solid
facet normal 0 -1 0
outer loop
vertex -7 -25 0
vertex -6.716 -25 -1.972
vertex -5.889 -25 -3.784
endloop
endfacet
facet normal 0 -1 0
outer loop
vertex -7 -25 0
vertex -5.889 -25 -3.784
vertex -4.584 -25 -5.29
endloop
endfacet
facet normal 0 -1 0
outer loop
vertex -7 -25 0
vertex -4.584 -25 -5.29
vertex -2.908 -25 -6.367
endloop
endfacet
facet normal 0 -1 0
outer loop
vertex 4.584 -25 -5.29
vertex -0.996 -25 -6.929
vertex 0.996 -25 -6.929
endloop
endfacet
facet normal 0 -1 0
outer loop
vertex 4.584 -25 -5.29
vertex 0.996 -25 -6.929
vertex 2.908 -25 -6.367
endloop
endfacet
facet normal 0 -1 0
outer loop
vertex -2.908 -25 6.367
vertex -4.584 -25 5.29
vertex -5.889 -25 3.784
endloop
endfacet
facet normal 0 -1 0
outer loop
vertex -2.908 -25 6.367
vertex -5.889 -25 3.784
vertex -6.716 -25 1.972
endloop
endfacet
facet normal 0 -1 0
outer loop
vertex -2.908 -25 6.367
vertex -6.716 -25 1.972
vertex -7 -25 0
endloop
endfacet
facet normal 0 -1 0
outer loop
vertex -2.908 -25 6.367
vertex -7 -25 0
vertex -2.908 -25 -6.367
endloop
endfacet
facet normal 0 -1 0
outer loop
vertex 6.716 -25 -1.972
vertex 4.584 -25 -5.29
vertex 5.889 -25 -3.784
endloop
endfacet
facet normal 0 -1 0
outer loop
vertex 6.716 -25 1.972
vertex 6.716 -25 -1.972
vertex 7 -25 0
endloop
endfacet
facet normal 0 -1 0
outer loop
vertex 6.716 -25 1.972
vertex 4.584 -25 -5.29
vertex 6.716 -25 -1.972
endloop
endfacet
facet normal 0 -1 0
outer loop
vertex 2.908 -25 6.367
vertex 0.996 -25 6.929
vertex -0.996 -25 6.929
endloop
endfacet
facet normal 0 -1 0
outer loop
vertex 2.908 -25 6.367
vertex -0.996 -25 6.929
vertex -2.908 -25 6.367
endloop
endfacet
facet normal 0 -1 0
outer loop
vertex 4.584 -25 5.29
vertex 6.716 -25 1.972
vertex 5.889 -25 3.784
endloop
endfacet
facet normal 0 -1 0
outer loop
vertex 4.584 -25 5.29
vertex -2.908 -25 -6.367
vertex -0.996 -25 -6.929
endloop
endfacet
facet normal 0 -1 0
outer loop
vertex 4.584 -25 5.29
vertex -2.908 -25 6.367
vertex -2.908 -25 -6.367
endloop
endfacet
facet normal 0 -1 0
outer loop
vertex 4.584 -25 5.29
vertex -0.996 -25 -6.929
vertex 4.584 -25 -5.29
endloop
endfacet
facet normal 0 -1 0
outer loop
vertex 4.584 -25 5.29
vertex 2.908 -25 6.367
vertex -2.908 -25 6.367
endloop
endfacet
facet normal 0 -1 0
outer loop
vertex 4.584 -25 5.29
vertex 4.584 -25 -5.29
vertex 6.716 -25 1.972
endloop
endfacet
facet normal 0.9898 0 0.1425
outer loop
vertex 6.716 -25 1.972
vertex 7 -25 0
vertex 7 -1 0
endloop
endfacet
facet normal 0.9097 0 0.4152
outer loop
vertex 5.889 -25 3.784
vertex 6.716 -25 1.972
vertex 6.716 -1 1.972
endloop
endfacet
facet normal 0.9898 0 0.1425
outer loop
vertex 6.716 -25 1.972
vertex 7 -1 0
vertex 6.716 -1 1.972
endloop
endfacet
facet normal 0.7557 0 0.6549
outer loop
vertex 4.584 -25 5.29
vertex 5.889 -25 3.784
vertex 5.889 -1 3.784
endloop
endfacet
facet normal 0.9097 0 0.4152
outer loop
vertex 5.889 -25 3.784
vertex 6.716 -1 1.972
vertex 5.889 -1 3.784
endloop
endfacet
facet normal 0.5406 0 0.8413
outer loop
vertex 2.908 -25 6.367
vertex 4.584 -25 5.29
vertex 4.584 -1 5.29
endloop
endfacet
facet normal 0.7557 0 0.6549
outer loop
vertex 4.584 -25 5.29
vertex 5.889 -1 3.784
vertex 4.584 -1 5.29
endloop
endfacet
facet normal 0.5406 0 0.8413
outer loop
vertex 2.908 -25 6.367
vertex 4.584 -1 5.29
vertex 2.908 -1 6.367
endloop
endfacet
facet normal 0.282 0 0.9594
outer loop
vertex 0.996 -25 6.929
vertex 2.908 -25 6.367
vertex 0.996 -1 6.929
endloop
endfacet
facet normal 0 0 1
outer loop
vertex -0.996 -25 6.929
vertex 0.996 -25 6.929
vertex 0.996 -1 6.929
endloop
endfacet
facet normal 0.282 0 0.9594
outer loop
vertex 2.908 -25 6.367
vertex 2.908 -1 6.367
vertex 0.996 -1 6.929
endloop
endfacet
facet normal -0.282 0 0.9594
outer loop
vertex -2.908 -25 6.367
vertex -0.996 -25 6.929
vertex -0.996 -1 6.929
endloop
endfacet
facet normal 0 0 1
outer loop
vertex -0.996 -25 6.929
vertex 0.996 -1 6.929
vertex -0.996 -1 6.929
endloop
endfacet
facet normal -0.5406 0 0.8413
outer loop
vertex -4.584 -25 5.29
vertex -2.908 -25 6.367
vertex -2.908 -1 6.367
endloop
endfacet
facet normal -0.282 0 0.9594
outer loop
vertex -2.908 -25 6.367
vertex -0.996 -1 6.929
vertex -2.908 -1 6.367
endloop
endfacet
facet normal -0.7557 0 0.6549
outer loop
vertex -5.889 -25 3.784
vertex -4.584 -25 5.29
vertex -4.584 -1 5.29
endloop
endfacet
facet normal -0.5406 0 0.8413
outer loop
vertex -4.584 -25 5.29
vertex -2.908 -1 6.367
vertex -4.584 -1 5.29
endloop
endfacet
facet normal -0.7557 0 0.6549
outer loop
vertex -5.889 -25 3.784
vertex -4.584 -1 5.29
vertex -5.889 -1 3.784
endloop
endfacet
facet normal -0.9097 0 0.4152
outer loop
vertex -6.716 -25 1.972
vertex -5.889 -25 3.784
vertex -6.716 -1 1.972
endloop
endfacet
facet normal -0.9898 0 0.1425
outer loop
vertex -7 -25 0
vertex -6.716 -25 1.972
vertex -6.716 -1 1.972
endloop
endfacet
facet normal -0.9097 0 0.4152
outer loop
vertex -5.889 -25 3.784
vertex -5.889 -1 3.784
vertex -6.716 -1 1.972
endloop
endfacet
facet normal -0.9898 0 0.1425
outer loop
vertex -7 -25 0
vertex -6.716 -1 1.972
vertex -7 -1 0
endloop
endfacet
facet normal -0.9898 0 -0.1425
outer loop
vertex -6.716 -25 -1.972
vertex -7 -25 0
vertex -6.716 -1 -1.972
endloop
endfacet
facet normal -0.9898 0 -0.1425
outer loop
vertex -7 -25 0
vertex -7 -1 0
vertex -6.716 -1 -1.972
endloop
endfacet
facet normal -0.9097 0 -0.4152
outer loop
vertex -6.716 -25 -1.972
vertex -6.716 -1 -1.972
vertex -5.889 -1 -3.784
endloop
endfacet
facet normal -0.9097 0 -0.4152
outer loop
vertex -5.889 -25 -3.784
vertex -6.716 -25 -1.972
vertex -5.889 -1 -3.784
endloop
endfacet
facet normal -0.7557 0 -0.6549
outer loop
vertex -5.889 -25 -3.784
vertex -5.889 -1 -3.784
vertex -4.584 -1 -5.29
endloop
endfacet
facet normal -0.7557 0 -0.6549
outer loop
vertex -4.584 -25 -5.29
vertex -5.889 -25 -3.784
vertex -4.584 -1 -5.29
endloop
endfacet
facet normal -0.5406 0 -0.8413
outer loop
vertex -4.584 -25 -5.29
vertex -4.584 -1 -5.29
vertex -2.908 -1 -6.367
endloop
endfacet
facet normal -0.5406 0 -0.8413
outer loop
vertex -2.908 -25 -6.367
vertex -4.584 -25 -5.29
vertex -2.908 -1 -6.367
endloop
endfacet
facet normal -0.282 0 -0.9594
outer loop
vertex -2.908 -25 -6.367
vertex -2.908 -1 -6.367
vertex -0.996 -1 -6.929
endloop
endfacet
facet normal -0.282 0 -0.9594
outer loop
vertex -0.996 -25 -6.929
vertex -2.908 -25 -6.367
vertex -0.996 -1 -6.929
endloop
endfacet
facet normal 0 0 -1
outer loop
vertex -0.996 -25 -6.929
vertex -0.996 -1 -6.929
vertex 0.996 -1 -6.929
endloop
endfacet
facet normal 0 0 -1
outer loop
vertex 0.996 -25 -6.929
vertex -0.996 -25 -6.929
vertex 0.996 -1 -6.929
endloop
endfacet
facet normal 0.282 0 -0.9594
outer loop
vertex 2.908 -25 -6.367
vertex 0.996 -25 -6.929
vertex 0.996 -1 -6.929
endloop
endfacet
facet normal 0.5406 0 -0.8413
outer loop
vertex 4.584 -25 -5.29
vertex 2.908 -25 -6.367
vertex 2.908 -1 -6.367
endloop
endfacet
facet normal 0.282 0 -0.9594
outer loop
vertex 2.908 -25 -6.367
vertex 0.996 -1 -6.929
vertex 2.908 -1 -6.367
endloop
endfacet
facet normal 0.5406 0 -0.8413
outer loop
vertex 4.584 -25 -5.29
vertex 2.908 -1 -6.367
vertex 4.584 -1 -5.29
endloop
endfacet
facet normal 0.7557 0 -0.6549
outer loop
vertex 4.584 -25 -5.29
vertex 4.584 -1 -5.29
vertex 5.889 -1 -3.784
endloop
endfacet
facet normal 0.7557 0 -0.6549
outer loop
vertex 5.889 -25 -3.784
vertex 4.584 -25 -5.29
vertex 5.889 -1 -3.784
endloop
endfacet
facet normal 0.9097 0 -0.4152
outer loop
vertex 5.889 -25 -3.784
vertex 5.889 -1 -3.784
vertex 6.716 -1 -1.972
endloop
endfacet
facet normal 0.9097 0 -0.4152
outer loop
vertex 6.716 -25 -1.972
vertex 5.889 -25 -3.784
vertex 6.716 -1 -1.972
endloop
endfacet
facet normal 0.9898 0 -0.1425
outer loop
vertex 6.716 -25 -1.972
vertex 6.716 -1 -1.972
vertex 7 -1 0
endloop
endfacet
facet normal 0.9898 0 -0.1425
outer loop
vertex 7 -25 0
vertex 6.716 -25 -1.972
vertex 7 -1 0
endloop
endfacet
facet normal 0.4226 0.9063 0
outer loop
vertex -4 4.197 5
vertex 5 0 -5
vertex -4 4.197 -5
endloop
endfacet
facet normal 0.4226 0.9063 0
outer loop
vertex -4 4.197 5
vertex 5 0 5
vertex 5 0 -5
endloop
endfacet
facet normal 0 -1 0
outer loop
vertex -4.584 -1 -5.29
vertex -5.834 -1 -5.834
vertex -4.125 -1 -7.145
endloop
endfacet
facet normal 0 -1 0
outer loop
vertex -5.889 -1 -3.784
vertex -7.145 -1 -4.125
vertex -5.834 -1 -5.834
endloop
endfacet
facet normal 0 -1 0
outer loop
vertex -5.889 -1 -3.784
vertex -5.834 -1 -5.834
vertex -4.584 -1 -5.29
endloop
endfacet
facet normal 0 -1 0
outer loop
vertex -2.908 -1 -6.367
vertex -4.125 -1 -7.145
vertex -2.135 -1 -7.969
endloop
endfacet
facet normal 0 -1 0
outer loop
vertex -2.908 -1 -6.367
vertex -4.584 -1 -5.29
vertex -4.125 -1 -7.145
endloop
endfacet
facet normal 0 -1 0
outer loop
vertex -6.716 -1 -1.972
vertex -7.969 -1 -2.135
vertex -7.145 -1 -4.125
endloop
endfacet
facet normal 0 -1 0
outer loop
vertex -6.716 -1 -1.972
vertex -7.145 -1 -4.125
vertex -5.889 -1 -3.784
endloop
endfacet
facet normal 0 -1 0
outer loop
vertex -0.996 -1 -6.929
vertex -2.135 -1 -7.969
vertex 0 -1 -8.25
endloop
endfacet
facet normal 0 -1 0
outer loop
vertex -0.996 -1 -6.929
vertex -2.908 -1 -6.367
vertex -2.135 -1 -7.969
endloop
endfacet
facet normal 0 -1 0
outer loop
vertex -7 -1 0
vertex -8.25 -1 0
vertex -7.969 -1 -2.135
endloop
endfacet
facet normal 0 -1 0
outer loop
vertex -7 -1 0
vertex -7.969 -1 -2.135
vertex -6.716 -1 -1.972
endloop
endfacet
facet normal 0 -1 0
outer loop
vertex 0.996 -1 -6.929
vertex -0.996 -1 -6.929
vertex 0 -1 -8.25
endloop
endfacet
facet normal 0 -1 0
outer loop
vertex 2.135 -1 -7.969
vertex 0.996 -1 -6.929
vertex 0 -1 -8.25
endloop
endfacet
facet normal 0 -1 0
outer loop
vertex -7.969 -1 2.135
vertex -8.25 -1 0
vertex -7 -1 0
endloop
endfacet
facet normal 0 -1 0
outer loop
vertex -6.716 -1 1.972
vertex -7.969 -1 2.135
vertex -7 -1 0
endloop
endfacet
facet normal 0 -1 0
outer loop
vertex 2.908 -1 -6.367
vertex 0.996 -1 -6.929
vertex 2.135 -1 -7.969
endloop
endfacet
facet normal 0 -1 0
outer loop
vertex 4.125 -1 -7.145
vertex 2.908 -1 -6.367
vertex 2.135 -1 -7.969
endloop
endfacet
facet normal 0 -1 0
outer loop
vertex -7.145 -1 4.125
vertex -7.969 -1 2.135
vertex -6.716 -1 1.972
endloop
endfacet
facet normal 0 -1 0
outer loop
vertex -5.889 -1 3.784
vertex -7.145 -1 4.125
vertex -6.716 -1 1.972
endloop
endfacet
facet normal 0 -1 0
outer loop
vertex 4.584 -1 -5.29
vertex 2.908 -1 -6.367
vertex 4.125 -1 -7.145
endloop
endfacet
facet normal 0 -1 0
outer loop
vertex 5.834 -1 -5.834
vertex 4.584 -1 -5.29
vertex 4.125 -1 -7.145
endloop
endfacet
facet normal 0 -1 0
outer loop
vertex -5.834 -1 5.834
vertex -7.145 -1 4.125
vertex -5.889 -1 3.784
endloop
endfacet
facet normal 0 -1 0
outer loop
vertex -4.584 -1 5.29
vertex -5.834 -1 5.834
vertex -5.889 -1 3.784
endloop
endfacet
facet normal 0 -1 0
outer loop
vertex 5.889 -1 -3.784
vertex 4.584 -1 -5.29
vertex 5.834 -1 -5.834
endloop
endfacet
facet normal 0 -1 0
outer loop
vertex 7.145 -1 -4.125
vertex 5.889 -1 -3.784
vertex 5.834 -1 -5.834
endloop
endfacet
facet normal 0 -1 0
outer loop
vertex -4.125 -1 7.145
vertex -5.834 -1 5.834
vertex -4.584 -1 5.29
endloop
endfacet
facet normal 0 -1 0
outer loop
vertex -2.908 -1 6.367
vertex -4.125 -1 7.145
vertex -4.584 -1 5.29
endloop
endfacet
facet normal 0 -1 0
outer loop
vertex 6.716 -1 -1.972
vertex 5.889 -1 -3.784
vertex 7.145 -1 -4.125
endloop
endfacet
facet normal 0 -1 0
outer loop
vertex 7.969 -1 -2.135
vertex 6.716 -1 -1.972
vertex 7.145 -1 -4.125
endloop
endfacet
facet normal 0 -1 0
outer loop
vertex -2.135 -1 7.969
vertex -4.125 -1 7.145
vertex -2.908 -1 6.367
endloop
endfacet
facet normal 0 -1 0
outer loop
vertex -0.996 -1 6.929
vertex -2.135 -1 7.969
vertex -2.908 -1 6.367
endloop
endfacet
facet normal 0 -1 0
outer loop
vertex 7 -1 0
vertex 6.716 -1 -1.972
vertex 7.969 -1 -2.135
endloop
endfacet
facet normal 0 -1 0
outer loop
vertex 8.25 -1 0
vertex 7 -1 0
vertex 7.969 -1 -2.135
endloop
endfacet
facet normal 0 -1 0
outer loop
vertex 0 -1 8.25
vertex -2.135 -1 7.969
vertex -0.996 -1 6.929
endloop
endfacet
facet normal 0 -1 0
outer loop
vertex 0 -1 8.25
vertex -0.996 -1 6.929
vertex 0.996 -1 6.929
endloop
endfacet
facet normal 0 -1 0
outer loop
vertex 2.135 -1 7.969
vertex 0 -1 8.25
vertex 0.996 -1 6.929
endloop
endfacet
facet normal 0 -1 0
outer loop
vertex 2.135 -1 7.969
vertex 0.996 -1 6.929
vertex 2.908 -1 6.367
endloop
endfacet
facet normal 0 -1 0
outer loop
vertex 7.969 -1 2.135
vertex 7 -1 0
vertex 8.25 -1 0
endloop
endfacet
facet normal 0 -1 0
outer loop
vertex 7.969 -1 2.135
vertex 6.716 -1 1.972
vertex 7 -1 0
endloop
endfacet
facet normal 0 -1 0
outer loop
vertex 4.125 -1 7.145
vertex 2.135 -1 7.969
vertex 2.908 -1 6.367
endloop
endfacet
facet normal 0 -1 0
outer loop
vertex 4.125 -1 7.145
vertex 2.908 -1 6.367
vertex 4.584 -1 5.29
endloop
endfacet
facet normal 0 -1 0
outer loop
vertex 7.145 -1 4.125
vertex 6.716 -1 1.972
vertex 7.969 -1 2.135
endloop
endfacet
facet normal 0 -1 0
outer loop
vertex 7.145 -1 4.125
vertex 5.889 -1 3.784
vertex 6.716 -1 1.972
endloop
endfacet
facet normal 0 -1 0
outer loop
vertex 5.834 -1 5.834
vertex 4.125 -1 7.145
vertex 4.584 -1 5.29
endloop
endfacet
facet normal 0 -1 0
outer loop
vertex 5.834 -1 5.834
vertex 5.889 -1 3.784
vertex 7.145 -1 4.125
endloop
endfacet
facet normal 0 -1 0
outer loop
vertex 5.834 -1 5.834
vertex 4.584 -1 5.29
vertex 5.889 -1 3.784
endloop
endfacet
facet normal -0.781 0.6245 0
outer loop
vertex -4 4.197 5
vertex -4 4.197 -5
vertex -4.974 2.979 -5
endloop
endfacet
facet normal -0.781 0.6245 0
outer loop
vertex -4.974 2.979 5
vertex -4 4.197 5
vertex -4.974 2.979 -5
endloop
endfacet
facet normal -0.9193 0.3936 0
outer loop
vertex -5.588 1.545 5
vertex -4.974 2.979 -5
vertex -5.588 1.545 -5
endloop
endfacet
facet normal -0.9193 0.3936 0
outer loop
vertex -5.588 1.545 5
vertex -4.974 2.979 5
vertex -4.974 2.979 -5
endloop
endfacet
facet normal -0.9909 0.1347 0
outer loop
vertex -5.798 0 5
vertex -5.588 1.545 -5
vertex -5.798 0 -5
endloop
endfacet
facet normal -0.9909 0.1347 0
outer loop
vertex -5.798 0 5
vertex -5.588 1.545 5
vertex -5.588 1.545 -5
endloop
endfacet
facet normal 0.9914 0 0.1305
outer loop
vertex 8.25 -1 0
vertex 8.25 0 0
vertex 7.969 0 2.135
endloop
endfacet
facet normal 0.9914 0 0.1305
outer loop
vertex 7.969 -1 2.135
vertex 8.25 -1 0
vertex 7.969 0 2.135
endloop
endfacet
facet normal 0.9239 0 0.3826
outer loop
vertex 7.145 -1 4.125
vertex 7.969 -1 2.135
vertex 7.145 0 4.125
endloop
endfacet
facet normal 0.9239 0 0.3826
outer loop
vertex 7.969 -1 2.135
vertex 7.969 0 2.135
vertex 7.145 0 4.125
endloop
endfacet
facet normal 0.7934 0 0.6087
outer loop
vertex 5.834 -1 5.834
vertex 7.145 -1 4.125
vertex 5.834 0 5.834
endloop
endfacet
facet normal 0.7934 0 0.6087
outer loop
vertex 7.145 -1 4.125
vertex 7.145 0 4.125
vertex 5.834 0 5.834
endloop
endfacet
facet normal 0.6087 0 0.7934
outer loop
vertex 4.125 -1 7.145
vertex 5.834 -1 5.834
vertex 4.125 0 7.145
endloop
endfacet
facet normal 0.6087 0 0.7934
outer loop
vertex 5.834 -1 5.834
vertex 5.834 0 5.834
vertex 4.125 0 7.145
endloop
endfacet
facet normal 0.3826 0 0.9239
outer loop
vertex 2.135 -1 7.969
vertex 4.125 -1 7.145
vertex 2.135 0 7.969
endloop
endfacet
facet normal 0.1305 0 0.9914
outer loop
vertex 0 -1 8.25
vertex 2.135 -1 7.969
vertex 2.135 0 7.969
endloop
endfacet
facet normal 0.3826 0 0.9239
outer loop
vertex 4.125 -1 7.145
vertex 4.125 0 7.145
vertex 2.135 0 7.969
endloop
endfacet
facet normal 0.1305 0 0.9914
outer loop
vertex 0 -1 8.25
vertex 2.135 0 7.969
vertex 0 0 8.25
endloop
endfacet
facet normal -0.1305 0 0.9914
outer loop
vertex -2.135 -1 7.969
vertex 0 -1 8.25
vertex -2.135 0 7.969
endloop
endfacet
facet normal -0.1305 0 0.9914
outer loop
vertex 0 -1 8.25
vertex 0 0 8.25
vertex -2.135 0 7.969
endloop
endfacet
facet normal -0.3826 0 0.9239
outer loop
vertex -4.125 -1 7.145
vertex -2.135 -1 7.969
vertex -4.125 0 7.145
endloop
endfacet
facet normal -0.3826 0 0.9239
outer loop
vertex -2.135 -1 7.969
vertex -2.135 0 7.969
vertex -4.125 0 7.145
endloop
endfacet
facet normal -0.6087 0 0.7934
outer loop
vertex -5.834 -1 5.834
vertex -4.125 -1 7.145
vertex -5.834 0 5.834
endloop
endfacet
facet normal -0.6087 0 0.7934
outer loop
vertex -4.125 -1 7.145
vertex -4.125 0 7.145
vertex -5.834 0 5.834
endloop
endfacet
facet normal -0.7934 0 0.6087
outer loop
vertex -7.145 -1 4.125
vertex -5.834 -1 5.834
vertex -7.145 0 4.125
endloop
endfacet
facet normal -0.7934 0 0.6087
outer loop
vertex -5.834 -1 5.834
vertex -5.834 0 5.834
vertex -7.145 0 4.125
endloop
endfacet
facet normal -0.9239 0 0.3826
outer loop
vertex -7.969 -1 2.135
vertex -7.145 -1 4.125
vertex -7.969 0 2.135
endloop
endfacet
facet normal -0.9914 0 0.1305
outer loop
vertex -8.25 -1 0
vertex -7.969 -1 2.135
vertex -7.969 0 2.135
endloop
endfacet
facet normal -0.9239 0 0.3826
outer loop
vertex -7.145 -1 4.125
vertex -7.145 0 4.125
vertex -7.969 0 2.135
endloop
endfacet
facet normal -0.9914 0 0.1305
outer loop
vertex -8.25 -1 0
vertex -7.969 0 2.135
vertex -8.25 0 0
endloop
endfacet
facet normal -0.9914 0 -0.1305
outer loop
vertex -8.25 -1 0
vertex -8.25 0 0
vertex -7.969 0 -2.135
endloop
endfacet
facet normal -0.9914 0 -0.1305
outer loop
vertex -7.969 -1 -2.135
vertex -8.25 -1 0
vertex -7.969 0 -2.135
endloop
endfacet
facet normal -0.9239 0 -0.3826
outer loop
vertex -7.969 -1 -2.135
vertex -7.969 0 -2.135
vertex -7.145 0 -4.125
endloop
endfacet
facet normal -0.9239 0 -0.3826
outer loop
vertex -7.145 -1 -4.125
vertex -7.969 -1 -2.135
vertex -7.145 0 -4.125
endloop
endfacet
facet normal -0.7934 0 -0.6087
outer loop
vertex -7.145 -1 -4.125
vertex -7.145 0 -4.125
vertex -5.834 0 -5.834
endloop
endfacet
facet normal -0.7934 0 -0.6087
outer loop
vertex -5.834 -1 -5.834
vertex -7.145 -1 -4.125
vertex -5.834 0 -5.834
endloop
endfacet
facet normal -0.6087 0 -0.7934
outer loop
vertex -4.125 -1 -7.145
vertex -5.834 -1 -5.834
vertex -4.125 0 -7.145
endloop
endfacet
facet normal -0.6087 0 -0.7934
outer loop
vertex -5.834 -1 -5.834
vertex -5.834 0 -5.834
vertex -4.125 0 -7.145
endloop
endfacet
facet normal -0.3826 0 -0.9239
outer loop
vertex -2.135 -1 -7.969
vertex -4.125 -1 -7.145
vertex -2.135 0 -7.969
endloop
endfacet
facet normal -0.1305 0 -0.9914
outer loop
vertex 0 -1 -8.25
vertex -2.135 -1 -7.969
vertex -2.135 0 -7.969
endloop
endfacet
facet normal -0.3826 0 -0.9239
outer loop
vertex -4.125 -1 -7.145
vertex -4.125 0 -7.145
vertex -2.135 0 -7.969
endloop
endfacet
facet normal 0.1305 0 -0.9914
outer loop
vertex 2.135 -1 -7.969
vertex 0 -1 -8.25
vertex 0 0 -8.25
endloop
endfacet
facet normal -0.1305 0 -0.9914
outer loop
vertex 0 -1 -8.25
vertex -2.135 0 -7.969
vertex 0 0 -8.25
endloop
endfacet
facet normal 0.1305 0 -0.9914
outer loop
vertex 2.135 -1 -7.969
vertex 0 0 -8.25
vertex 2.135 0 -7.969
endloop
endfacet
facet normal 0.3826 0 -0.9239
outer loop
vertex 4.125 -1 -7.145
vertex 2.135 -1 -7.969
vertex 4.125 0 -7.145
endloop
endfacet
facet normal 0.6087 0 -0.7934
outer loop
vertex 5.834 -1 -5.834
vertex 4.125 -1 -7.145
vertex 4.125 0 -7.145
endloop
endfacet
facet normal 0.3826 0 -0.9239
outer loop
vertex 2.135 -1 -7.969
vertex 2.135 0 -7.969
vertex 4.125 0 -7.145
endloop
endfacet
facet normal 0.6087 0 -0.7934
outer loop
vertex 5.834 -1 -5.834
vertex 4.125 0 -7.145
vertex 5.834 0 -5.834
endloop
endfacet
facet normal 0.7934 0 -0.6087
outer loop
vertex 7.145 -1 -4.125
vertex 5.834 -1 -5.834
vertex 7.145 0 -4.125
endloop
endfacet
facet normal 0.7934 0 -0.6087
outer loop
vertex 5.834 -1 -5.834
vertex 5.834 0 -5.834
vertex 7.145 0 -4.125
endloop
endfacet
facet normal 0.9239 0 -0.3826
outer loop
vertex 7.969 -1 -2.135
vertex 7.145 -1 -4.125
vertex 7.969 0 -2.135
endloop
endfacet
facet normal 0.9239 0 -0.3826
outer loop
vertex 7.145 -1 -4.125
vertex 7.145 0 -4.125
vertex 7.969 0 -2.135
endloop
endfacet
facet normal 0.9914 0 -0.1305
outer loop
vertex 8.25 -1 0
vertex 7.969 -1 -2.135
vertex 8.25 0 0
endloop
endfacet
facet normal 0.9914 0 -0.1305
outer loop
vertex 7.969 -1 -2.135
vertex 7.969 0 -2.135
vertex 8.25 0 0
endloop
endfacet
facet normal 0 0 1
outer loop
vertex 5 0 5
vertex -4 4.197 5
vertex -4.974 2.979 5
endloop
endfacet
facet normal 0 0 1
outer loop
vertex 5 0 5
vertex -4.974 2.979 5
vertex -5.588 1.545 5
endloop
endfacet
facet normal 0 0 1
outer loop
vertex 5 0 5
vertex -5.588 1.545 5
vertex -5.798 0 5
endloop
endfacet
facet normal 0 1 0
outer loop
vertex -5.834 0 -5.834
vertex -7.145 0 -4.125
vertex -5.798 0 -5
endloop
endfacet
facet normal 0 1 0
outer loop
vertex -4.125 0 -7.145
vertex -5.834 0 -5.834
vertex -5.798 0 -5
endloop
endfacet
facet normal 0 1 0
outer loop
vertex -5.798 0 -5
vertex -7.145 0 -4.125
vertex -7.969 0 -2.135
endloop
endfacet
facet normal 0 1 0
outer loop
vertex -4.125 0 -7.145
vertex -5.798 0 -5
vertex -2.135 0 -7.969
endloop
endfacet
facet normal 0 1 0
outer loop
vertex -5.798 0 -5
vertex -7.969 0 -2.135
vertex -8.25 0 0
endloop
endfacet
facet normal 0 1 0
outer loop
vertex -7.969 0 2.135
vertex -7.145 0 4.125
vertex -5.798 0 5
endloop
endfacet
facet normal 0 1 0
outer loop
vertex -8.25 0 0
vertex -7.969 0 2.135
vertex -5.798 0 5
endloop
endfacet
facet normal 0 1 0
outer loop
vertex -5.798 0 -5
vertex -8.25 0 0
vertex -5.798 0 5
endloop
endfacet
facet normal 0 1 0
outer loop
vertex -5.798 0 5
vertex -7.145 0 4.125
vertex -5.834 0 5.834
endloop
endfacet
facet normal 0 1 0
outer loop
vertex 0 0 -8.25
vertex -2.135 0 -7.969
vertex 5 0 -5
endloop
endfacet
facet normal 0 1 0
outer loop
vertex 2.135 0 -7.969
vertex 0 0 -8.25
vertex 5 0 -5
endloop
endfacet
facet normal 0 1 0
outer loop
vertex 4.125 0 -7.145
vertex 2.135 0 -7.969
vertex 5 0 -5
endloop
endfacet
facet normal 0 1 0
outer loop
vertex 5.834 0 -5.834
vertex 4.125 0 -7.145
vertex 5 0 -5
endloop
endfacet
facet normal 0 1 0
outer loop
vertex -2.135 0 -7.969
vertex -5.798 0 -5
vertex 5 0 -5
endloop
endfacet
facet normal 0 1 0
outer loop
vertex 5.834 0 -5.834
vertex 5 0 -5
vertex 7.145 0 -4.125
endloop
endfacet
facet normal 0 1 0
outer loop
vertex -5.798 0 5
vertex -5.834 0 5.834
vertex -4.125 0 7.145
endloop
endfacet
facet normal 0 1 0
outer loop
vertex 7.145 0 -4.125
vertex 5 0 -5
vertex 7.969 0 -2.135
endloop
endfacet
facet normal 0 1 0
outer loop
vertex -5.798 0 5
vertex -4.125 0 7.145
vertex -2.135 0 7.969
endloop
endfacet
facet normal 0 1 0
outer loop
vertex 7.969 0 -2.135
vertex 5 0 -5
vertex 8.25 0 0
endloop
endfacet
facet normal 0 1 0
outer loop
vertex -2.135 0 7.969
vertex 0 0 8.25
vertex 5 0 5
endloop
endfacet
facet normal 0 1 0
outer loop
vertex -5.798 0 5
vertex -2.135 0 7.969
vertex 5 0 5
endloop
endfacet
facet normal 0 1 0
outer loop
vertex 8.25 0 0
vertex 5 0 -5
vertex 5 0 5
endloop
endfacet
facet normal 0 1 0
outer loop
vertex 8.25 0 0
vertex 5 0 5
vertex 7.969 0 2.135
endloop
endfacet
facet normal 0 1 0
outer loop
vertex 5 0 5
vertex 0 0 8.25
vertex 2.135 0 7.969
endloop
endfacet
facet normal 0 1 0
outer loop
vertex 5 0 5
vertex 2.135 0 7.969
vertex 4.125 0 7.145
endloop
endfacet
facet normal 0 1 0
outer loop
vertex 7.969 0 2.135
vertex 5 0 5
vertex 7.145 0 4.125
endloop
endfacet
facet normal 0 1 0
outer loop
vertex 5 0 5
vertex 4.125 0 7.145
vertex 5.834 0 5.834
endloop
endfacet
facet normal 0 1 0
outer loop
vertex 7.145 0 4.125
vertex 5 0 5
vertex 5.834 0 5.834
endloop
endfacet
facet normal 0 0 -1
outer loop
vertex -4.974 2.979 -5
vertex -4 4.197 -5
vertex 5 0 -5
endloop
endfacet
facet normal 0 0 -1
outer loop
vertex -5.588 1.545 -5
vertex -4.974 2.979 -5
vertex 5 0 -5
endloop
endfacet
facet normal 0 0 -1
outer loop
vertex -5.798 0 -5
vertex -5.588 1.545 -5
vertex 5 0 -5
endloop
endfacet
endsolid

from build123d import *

# Parameters (mm, degrees)
F0_R     = 8.25
F1_DEPTH = 1
F2_R     = 7
F3_DEPTH = 25
F5_DEPTH = 5


with BuildPart() as f1:
    # F0 (on Front) → F1 (new body)
    with BuildSketch(Plane.XZ):
        Circle(F0_R)
    extrude(amount=F1_DEPTH)

    # F2 (on Front) → F3 (join)
    with BuildSketch(Plane.XZ):
        Circle(F2_R)
    extrude(amount=F3_DEPTH)

    # F4 (on Top) → F5 (join, symmetric)
    with BuildSketch(Plane.XY):
        with BuildLine():
            ThreePointArc((-4, 4.1967689234), (-5.329329795, 2.2827863089), (-5.7976606831, 0))
            Line((-5.7976606831, 0), (5, 0))
            Line((5, 0), (-4, 4.1967689234))
        make_face()
    extrude(amount=F5_DEPTH, both=True)


solid = f1.part
